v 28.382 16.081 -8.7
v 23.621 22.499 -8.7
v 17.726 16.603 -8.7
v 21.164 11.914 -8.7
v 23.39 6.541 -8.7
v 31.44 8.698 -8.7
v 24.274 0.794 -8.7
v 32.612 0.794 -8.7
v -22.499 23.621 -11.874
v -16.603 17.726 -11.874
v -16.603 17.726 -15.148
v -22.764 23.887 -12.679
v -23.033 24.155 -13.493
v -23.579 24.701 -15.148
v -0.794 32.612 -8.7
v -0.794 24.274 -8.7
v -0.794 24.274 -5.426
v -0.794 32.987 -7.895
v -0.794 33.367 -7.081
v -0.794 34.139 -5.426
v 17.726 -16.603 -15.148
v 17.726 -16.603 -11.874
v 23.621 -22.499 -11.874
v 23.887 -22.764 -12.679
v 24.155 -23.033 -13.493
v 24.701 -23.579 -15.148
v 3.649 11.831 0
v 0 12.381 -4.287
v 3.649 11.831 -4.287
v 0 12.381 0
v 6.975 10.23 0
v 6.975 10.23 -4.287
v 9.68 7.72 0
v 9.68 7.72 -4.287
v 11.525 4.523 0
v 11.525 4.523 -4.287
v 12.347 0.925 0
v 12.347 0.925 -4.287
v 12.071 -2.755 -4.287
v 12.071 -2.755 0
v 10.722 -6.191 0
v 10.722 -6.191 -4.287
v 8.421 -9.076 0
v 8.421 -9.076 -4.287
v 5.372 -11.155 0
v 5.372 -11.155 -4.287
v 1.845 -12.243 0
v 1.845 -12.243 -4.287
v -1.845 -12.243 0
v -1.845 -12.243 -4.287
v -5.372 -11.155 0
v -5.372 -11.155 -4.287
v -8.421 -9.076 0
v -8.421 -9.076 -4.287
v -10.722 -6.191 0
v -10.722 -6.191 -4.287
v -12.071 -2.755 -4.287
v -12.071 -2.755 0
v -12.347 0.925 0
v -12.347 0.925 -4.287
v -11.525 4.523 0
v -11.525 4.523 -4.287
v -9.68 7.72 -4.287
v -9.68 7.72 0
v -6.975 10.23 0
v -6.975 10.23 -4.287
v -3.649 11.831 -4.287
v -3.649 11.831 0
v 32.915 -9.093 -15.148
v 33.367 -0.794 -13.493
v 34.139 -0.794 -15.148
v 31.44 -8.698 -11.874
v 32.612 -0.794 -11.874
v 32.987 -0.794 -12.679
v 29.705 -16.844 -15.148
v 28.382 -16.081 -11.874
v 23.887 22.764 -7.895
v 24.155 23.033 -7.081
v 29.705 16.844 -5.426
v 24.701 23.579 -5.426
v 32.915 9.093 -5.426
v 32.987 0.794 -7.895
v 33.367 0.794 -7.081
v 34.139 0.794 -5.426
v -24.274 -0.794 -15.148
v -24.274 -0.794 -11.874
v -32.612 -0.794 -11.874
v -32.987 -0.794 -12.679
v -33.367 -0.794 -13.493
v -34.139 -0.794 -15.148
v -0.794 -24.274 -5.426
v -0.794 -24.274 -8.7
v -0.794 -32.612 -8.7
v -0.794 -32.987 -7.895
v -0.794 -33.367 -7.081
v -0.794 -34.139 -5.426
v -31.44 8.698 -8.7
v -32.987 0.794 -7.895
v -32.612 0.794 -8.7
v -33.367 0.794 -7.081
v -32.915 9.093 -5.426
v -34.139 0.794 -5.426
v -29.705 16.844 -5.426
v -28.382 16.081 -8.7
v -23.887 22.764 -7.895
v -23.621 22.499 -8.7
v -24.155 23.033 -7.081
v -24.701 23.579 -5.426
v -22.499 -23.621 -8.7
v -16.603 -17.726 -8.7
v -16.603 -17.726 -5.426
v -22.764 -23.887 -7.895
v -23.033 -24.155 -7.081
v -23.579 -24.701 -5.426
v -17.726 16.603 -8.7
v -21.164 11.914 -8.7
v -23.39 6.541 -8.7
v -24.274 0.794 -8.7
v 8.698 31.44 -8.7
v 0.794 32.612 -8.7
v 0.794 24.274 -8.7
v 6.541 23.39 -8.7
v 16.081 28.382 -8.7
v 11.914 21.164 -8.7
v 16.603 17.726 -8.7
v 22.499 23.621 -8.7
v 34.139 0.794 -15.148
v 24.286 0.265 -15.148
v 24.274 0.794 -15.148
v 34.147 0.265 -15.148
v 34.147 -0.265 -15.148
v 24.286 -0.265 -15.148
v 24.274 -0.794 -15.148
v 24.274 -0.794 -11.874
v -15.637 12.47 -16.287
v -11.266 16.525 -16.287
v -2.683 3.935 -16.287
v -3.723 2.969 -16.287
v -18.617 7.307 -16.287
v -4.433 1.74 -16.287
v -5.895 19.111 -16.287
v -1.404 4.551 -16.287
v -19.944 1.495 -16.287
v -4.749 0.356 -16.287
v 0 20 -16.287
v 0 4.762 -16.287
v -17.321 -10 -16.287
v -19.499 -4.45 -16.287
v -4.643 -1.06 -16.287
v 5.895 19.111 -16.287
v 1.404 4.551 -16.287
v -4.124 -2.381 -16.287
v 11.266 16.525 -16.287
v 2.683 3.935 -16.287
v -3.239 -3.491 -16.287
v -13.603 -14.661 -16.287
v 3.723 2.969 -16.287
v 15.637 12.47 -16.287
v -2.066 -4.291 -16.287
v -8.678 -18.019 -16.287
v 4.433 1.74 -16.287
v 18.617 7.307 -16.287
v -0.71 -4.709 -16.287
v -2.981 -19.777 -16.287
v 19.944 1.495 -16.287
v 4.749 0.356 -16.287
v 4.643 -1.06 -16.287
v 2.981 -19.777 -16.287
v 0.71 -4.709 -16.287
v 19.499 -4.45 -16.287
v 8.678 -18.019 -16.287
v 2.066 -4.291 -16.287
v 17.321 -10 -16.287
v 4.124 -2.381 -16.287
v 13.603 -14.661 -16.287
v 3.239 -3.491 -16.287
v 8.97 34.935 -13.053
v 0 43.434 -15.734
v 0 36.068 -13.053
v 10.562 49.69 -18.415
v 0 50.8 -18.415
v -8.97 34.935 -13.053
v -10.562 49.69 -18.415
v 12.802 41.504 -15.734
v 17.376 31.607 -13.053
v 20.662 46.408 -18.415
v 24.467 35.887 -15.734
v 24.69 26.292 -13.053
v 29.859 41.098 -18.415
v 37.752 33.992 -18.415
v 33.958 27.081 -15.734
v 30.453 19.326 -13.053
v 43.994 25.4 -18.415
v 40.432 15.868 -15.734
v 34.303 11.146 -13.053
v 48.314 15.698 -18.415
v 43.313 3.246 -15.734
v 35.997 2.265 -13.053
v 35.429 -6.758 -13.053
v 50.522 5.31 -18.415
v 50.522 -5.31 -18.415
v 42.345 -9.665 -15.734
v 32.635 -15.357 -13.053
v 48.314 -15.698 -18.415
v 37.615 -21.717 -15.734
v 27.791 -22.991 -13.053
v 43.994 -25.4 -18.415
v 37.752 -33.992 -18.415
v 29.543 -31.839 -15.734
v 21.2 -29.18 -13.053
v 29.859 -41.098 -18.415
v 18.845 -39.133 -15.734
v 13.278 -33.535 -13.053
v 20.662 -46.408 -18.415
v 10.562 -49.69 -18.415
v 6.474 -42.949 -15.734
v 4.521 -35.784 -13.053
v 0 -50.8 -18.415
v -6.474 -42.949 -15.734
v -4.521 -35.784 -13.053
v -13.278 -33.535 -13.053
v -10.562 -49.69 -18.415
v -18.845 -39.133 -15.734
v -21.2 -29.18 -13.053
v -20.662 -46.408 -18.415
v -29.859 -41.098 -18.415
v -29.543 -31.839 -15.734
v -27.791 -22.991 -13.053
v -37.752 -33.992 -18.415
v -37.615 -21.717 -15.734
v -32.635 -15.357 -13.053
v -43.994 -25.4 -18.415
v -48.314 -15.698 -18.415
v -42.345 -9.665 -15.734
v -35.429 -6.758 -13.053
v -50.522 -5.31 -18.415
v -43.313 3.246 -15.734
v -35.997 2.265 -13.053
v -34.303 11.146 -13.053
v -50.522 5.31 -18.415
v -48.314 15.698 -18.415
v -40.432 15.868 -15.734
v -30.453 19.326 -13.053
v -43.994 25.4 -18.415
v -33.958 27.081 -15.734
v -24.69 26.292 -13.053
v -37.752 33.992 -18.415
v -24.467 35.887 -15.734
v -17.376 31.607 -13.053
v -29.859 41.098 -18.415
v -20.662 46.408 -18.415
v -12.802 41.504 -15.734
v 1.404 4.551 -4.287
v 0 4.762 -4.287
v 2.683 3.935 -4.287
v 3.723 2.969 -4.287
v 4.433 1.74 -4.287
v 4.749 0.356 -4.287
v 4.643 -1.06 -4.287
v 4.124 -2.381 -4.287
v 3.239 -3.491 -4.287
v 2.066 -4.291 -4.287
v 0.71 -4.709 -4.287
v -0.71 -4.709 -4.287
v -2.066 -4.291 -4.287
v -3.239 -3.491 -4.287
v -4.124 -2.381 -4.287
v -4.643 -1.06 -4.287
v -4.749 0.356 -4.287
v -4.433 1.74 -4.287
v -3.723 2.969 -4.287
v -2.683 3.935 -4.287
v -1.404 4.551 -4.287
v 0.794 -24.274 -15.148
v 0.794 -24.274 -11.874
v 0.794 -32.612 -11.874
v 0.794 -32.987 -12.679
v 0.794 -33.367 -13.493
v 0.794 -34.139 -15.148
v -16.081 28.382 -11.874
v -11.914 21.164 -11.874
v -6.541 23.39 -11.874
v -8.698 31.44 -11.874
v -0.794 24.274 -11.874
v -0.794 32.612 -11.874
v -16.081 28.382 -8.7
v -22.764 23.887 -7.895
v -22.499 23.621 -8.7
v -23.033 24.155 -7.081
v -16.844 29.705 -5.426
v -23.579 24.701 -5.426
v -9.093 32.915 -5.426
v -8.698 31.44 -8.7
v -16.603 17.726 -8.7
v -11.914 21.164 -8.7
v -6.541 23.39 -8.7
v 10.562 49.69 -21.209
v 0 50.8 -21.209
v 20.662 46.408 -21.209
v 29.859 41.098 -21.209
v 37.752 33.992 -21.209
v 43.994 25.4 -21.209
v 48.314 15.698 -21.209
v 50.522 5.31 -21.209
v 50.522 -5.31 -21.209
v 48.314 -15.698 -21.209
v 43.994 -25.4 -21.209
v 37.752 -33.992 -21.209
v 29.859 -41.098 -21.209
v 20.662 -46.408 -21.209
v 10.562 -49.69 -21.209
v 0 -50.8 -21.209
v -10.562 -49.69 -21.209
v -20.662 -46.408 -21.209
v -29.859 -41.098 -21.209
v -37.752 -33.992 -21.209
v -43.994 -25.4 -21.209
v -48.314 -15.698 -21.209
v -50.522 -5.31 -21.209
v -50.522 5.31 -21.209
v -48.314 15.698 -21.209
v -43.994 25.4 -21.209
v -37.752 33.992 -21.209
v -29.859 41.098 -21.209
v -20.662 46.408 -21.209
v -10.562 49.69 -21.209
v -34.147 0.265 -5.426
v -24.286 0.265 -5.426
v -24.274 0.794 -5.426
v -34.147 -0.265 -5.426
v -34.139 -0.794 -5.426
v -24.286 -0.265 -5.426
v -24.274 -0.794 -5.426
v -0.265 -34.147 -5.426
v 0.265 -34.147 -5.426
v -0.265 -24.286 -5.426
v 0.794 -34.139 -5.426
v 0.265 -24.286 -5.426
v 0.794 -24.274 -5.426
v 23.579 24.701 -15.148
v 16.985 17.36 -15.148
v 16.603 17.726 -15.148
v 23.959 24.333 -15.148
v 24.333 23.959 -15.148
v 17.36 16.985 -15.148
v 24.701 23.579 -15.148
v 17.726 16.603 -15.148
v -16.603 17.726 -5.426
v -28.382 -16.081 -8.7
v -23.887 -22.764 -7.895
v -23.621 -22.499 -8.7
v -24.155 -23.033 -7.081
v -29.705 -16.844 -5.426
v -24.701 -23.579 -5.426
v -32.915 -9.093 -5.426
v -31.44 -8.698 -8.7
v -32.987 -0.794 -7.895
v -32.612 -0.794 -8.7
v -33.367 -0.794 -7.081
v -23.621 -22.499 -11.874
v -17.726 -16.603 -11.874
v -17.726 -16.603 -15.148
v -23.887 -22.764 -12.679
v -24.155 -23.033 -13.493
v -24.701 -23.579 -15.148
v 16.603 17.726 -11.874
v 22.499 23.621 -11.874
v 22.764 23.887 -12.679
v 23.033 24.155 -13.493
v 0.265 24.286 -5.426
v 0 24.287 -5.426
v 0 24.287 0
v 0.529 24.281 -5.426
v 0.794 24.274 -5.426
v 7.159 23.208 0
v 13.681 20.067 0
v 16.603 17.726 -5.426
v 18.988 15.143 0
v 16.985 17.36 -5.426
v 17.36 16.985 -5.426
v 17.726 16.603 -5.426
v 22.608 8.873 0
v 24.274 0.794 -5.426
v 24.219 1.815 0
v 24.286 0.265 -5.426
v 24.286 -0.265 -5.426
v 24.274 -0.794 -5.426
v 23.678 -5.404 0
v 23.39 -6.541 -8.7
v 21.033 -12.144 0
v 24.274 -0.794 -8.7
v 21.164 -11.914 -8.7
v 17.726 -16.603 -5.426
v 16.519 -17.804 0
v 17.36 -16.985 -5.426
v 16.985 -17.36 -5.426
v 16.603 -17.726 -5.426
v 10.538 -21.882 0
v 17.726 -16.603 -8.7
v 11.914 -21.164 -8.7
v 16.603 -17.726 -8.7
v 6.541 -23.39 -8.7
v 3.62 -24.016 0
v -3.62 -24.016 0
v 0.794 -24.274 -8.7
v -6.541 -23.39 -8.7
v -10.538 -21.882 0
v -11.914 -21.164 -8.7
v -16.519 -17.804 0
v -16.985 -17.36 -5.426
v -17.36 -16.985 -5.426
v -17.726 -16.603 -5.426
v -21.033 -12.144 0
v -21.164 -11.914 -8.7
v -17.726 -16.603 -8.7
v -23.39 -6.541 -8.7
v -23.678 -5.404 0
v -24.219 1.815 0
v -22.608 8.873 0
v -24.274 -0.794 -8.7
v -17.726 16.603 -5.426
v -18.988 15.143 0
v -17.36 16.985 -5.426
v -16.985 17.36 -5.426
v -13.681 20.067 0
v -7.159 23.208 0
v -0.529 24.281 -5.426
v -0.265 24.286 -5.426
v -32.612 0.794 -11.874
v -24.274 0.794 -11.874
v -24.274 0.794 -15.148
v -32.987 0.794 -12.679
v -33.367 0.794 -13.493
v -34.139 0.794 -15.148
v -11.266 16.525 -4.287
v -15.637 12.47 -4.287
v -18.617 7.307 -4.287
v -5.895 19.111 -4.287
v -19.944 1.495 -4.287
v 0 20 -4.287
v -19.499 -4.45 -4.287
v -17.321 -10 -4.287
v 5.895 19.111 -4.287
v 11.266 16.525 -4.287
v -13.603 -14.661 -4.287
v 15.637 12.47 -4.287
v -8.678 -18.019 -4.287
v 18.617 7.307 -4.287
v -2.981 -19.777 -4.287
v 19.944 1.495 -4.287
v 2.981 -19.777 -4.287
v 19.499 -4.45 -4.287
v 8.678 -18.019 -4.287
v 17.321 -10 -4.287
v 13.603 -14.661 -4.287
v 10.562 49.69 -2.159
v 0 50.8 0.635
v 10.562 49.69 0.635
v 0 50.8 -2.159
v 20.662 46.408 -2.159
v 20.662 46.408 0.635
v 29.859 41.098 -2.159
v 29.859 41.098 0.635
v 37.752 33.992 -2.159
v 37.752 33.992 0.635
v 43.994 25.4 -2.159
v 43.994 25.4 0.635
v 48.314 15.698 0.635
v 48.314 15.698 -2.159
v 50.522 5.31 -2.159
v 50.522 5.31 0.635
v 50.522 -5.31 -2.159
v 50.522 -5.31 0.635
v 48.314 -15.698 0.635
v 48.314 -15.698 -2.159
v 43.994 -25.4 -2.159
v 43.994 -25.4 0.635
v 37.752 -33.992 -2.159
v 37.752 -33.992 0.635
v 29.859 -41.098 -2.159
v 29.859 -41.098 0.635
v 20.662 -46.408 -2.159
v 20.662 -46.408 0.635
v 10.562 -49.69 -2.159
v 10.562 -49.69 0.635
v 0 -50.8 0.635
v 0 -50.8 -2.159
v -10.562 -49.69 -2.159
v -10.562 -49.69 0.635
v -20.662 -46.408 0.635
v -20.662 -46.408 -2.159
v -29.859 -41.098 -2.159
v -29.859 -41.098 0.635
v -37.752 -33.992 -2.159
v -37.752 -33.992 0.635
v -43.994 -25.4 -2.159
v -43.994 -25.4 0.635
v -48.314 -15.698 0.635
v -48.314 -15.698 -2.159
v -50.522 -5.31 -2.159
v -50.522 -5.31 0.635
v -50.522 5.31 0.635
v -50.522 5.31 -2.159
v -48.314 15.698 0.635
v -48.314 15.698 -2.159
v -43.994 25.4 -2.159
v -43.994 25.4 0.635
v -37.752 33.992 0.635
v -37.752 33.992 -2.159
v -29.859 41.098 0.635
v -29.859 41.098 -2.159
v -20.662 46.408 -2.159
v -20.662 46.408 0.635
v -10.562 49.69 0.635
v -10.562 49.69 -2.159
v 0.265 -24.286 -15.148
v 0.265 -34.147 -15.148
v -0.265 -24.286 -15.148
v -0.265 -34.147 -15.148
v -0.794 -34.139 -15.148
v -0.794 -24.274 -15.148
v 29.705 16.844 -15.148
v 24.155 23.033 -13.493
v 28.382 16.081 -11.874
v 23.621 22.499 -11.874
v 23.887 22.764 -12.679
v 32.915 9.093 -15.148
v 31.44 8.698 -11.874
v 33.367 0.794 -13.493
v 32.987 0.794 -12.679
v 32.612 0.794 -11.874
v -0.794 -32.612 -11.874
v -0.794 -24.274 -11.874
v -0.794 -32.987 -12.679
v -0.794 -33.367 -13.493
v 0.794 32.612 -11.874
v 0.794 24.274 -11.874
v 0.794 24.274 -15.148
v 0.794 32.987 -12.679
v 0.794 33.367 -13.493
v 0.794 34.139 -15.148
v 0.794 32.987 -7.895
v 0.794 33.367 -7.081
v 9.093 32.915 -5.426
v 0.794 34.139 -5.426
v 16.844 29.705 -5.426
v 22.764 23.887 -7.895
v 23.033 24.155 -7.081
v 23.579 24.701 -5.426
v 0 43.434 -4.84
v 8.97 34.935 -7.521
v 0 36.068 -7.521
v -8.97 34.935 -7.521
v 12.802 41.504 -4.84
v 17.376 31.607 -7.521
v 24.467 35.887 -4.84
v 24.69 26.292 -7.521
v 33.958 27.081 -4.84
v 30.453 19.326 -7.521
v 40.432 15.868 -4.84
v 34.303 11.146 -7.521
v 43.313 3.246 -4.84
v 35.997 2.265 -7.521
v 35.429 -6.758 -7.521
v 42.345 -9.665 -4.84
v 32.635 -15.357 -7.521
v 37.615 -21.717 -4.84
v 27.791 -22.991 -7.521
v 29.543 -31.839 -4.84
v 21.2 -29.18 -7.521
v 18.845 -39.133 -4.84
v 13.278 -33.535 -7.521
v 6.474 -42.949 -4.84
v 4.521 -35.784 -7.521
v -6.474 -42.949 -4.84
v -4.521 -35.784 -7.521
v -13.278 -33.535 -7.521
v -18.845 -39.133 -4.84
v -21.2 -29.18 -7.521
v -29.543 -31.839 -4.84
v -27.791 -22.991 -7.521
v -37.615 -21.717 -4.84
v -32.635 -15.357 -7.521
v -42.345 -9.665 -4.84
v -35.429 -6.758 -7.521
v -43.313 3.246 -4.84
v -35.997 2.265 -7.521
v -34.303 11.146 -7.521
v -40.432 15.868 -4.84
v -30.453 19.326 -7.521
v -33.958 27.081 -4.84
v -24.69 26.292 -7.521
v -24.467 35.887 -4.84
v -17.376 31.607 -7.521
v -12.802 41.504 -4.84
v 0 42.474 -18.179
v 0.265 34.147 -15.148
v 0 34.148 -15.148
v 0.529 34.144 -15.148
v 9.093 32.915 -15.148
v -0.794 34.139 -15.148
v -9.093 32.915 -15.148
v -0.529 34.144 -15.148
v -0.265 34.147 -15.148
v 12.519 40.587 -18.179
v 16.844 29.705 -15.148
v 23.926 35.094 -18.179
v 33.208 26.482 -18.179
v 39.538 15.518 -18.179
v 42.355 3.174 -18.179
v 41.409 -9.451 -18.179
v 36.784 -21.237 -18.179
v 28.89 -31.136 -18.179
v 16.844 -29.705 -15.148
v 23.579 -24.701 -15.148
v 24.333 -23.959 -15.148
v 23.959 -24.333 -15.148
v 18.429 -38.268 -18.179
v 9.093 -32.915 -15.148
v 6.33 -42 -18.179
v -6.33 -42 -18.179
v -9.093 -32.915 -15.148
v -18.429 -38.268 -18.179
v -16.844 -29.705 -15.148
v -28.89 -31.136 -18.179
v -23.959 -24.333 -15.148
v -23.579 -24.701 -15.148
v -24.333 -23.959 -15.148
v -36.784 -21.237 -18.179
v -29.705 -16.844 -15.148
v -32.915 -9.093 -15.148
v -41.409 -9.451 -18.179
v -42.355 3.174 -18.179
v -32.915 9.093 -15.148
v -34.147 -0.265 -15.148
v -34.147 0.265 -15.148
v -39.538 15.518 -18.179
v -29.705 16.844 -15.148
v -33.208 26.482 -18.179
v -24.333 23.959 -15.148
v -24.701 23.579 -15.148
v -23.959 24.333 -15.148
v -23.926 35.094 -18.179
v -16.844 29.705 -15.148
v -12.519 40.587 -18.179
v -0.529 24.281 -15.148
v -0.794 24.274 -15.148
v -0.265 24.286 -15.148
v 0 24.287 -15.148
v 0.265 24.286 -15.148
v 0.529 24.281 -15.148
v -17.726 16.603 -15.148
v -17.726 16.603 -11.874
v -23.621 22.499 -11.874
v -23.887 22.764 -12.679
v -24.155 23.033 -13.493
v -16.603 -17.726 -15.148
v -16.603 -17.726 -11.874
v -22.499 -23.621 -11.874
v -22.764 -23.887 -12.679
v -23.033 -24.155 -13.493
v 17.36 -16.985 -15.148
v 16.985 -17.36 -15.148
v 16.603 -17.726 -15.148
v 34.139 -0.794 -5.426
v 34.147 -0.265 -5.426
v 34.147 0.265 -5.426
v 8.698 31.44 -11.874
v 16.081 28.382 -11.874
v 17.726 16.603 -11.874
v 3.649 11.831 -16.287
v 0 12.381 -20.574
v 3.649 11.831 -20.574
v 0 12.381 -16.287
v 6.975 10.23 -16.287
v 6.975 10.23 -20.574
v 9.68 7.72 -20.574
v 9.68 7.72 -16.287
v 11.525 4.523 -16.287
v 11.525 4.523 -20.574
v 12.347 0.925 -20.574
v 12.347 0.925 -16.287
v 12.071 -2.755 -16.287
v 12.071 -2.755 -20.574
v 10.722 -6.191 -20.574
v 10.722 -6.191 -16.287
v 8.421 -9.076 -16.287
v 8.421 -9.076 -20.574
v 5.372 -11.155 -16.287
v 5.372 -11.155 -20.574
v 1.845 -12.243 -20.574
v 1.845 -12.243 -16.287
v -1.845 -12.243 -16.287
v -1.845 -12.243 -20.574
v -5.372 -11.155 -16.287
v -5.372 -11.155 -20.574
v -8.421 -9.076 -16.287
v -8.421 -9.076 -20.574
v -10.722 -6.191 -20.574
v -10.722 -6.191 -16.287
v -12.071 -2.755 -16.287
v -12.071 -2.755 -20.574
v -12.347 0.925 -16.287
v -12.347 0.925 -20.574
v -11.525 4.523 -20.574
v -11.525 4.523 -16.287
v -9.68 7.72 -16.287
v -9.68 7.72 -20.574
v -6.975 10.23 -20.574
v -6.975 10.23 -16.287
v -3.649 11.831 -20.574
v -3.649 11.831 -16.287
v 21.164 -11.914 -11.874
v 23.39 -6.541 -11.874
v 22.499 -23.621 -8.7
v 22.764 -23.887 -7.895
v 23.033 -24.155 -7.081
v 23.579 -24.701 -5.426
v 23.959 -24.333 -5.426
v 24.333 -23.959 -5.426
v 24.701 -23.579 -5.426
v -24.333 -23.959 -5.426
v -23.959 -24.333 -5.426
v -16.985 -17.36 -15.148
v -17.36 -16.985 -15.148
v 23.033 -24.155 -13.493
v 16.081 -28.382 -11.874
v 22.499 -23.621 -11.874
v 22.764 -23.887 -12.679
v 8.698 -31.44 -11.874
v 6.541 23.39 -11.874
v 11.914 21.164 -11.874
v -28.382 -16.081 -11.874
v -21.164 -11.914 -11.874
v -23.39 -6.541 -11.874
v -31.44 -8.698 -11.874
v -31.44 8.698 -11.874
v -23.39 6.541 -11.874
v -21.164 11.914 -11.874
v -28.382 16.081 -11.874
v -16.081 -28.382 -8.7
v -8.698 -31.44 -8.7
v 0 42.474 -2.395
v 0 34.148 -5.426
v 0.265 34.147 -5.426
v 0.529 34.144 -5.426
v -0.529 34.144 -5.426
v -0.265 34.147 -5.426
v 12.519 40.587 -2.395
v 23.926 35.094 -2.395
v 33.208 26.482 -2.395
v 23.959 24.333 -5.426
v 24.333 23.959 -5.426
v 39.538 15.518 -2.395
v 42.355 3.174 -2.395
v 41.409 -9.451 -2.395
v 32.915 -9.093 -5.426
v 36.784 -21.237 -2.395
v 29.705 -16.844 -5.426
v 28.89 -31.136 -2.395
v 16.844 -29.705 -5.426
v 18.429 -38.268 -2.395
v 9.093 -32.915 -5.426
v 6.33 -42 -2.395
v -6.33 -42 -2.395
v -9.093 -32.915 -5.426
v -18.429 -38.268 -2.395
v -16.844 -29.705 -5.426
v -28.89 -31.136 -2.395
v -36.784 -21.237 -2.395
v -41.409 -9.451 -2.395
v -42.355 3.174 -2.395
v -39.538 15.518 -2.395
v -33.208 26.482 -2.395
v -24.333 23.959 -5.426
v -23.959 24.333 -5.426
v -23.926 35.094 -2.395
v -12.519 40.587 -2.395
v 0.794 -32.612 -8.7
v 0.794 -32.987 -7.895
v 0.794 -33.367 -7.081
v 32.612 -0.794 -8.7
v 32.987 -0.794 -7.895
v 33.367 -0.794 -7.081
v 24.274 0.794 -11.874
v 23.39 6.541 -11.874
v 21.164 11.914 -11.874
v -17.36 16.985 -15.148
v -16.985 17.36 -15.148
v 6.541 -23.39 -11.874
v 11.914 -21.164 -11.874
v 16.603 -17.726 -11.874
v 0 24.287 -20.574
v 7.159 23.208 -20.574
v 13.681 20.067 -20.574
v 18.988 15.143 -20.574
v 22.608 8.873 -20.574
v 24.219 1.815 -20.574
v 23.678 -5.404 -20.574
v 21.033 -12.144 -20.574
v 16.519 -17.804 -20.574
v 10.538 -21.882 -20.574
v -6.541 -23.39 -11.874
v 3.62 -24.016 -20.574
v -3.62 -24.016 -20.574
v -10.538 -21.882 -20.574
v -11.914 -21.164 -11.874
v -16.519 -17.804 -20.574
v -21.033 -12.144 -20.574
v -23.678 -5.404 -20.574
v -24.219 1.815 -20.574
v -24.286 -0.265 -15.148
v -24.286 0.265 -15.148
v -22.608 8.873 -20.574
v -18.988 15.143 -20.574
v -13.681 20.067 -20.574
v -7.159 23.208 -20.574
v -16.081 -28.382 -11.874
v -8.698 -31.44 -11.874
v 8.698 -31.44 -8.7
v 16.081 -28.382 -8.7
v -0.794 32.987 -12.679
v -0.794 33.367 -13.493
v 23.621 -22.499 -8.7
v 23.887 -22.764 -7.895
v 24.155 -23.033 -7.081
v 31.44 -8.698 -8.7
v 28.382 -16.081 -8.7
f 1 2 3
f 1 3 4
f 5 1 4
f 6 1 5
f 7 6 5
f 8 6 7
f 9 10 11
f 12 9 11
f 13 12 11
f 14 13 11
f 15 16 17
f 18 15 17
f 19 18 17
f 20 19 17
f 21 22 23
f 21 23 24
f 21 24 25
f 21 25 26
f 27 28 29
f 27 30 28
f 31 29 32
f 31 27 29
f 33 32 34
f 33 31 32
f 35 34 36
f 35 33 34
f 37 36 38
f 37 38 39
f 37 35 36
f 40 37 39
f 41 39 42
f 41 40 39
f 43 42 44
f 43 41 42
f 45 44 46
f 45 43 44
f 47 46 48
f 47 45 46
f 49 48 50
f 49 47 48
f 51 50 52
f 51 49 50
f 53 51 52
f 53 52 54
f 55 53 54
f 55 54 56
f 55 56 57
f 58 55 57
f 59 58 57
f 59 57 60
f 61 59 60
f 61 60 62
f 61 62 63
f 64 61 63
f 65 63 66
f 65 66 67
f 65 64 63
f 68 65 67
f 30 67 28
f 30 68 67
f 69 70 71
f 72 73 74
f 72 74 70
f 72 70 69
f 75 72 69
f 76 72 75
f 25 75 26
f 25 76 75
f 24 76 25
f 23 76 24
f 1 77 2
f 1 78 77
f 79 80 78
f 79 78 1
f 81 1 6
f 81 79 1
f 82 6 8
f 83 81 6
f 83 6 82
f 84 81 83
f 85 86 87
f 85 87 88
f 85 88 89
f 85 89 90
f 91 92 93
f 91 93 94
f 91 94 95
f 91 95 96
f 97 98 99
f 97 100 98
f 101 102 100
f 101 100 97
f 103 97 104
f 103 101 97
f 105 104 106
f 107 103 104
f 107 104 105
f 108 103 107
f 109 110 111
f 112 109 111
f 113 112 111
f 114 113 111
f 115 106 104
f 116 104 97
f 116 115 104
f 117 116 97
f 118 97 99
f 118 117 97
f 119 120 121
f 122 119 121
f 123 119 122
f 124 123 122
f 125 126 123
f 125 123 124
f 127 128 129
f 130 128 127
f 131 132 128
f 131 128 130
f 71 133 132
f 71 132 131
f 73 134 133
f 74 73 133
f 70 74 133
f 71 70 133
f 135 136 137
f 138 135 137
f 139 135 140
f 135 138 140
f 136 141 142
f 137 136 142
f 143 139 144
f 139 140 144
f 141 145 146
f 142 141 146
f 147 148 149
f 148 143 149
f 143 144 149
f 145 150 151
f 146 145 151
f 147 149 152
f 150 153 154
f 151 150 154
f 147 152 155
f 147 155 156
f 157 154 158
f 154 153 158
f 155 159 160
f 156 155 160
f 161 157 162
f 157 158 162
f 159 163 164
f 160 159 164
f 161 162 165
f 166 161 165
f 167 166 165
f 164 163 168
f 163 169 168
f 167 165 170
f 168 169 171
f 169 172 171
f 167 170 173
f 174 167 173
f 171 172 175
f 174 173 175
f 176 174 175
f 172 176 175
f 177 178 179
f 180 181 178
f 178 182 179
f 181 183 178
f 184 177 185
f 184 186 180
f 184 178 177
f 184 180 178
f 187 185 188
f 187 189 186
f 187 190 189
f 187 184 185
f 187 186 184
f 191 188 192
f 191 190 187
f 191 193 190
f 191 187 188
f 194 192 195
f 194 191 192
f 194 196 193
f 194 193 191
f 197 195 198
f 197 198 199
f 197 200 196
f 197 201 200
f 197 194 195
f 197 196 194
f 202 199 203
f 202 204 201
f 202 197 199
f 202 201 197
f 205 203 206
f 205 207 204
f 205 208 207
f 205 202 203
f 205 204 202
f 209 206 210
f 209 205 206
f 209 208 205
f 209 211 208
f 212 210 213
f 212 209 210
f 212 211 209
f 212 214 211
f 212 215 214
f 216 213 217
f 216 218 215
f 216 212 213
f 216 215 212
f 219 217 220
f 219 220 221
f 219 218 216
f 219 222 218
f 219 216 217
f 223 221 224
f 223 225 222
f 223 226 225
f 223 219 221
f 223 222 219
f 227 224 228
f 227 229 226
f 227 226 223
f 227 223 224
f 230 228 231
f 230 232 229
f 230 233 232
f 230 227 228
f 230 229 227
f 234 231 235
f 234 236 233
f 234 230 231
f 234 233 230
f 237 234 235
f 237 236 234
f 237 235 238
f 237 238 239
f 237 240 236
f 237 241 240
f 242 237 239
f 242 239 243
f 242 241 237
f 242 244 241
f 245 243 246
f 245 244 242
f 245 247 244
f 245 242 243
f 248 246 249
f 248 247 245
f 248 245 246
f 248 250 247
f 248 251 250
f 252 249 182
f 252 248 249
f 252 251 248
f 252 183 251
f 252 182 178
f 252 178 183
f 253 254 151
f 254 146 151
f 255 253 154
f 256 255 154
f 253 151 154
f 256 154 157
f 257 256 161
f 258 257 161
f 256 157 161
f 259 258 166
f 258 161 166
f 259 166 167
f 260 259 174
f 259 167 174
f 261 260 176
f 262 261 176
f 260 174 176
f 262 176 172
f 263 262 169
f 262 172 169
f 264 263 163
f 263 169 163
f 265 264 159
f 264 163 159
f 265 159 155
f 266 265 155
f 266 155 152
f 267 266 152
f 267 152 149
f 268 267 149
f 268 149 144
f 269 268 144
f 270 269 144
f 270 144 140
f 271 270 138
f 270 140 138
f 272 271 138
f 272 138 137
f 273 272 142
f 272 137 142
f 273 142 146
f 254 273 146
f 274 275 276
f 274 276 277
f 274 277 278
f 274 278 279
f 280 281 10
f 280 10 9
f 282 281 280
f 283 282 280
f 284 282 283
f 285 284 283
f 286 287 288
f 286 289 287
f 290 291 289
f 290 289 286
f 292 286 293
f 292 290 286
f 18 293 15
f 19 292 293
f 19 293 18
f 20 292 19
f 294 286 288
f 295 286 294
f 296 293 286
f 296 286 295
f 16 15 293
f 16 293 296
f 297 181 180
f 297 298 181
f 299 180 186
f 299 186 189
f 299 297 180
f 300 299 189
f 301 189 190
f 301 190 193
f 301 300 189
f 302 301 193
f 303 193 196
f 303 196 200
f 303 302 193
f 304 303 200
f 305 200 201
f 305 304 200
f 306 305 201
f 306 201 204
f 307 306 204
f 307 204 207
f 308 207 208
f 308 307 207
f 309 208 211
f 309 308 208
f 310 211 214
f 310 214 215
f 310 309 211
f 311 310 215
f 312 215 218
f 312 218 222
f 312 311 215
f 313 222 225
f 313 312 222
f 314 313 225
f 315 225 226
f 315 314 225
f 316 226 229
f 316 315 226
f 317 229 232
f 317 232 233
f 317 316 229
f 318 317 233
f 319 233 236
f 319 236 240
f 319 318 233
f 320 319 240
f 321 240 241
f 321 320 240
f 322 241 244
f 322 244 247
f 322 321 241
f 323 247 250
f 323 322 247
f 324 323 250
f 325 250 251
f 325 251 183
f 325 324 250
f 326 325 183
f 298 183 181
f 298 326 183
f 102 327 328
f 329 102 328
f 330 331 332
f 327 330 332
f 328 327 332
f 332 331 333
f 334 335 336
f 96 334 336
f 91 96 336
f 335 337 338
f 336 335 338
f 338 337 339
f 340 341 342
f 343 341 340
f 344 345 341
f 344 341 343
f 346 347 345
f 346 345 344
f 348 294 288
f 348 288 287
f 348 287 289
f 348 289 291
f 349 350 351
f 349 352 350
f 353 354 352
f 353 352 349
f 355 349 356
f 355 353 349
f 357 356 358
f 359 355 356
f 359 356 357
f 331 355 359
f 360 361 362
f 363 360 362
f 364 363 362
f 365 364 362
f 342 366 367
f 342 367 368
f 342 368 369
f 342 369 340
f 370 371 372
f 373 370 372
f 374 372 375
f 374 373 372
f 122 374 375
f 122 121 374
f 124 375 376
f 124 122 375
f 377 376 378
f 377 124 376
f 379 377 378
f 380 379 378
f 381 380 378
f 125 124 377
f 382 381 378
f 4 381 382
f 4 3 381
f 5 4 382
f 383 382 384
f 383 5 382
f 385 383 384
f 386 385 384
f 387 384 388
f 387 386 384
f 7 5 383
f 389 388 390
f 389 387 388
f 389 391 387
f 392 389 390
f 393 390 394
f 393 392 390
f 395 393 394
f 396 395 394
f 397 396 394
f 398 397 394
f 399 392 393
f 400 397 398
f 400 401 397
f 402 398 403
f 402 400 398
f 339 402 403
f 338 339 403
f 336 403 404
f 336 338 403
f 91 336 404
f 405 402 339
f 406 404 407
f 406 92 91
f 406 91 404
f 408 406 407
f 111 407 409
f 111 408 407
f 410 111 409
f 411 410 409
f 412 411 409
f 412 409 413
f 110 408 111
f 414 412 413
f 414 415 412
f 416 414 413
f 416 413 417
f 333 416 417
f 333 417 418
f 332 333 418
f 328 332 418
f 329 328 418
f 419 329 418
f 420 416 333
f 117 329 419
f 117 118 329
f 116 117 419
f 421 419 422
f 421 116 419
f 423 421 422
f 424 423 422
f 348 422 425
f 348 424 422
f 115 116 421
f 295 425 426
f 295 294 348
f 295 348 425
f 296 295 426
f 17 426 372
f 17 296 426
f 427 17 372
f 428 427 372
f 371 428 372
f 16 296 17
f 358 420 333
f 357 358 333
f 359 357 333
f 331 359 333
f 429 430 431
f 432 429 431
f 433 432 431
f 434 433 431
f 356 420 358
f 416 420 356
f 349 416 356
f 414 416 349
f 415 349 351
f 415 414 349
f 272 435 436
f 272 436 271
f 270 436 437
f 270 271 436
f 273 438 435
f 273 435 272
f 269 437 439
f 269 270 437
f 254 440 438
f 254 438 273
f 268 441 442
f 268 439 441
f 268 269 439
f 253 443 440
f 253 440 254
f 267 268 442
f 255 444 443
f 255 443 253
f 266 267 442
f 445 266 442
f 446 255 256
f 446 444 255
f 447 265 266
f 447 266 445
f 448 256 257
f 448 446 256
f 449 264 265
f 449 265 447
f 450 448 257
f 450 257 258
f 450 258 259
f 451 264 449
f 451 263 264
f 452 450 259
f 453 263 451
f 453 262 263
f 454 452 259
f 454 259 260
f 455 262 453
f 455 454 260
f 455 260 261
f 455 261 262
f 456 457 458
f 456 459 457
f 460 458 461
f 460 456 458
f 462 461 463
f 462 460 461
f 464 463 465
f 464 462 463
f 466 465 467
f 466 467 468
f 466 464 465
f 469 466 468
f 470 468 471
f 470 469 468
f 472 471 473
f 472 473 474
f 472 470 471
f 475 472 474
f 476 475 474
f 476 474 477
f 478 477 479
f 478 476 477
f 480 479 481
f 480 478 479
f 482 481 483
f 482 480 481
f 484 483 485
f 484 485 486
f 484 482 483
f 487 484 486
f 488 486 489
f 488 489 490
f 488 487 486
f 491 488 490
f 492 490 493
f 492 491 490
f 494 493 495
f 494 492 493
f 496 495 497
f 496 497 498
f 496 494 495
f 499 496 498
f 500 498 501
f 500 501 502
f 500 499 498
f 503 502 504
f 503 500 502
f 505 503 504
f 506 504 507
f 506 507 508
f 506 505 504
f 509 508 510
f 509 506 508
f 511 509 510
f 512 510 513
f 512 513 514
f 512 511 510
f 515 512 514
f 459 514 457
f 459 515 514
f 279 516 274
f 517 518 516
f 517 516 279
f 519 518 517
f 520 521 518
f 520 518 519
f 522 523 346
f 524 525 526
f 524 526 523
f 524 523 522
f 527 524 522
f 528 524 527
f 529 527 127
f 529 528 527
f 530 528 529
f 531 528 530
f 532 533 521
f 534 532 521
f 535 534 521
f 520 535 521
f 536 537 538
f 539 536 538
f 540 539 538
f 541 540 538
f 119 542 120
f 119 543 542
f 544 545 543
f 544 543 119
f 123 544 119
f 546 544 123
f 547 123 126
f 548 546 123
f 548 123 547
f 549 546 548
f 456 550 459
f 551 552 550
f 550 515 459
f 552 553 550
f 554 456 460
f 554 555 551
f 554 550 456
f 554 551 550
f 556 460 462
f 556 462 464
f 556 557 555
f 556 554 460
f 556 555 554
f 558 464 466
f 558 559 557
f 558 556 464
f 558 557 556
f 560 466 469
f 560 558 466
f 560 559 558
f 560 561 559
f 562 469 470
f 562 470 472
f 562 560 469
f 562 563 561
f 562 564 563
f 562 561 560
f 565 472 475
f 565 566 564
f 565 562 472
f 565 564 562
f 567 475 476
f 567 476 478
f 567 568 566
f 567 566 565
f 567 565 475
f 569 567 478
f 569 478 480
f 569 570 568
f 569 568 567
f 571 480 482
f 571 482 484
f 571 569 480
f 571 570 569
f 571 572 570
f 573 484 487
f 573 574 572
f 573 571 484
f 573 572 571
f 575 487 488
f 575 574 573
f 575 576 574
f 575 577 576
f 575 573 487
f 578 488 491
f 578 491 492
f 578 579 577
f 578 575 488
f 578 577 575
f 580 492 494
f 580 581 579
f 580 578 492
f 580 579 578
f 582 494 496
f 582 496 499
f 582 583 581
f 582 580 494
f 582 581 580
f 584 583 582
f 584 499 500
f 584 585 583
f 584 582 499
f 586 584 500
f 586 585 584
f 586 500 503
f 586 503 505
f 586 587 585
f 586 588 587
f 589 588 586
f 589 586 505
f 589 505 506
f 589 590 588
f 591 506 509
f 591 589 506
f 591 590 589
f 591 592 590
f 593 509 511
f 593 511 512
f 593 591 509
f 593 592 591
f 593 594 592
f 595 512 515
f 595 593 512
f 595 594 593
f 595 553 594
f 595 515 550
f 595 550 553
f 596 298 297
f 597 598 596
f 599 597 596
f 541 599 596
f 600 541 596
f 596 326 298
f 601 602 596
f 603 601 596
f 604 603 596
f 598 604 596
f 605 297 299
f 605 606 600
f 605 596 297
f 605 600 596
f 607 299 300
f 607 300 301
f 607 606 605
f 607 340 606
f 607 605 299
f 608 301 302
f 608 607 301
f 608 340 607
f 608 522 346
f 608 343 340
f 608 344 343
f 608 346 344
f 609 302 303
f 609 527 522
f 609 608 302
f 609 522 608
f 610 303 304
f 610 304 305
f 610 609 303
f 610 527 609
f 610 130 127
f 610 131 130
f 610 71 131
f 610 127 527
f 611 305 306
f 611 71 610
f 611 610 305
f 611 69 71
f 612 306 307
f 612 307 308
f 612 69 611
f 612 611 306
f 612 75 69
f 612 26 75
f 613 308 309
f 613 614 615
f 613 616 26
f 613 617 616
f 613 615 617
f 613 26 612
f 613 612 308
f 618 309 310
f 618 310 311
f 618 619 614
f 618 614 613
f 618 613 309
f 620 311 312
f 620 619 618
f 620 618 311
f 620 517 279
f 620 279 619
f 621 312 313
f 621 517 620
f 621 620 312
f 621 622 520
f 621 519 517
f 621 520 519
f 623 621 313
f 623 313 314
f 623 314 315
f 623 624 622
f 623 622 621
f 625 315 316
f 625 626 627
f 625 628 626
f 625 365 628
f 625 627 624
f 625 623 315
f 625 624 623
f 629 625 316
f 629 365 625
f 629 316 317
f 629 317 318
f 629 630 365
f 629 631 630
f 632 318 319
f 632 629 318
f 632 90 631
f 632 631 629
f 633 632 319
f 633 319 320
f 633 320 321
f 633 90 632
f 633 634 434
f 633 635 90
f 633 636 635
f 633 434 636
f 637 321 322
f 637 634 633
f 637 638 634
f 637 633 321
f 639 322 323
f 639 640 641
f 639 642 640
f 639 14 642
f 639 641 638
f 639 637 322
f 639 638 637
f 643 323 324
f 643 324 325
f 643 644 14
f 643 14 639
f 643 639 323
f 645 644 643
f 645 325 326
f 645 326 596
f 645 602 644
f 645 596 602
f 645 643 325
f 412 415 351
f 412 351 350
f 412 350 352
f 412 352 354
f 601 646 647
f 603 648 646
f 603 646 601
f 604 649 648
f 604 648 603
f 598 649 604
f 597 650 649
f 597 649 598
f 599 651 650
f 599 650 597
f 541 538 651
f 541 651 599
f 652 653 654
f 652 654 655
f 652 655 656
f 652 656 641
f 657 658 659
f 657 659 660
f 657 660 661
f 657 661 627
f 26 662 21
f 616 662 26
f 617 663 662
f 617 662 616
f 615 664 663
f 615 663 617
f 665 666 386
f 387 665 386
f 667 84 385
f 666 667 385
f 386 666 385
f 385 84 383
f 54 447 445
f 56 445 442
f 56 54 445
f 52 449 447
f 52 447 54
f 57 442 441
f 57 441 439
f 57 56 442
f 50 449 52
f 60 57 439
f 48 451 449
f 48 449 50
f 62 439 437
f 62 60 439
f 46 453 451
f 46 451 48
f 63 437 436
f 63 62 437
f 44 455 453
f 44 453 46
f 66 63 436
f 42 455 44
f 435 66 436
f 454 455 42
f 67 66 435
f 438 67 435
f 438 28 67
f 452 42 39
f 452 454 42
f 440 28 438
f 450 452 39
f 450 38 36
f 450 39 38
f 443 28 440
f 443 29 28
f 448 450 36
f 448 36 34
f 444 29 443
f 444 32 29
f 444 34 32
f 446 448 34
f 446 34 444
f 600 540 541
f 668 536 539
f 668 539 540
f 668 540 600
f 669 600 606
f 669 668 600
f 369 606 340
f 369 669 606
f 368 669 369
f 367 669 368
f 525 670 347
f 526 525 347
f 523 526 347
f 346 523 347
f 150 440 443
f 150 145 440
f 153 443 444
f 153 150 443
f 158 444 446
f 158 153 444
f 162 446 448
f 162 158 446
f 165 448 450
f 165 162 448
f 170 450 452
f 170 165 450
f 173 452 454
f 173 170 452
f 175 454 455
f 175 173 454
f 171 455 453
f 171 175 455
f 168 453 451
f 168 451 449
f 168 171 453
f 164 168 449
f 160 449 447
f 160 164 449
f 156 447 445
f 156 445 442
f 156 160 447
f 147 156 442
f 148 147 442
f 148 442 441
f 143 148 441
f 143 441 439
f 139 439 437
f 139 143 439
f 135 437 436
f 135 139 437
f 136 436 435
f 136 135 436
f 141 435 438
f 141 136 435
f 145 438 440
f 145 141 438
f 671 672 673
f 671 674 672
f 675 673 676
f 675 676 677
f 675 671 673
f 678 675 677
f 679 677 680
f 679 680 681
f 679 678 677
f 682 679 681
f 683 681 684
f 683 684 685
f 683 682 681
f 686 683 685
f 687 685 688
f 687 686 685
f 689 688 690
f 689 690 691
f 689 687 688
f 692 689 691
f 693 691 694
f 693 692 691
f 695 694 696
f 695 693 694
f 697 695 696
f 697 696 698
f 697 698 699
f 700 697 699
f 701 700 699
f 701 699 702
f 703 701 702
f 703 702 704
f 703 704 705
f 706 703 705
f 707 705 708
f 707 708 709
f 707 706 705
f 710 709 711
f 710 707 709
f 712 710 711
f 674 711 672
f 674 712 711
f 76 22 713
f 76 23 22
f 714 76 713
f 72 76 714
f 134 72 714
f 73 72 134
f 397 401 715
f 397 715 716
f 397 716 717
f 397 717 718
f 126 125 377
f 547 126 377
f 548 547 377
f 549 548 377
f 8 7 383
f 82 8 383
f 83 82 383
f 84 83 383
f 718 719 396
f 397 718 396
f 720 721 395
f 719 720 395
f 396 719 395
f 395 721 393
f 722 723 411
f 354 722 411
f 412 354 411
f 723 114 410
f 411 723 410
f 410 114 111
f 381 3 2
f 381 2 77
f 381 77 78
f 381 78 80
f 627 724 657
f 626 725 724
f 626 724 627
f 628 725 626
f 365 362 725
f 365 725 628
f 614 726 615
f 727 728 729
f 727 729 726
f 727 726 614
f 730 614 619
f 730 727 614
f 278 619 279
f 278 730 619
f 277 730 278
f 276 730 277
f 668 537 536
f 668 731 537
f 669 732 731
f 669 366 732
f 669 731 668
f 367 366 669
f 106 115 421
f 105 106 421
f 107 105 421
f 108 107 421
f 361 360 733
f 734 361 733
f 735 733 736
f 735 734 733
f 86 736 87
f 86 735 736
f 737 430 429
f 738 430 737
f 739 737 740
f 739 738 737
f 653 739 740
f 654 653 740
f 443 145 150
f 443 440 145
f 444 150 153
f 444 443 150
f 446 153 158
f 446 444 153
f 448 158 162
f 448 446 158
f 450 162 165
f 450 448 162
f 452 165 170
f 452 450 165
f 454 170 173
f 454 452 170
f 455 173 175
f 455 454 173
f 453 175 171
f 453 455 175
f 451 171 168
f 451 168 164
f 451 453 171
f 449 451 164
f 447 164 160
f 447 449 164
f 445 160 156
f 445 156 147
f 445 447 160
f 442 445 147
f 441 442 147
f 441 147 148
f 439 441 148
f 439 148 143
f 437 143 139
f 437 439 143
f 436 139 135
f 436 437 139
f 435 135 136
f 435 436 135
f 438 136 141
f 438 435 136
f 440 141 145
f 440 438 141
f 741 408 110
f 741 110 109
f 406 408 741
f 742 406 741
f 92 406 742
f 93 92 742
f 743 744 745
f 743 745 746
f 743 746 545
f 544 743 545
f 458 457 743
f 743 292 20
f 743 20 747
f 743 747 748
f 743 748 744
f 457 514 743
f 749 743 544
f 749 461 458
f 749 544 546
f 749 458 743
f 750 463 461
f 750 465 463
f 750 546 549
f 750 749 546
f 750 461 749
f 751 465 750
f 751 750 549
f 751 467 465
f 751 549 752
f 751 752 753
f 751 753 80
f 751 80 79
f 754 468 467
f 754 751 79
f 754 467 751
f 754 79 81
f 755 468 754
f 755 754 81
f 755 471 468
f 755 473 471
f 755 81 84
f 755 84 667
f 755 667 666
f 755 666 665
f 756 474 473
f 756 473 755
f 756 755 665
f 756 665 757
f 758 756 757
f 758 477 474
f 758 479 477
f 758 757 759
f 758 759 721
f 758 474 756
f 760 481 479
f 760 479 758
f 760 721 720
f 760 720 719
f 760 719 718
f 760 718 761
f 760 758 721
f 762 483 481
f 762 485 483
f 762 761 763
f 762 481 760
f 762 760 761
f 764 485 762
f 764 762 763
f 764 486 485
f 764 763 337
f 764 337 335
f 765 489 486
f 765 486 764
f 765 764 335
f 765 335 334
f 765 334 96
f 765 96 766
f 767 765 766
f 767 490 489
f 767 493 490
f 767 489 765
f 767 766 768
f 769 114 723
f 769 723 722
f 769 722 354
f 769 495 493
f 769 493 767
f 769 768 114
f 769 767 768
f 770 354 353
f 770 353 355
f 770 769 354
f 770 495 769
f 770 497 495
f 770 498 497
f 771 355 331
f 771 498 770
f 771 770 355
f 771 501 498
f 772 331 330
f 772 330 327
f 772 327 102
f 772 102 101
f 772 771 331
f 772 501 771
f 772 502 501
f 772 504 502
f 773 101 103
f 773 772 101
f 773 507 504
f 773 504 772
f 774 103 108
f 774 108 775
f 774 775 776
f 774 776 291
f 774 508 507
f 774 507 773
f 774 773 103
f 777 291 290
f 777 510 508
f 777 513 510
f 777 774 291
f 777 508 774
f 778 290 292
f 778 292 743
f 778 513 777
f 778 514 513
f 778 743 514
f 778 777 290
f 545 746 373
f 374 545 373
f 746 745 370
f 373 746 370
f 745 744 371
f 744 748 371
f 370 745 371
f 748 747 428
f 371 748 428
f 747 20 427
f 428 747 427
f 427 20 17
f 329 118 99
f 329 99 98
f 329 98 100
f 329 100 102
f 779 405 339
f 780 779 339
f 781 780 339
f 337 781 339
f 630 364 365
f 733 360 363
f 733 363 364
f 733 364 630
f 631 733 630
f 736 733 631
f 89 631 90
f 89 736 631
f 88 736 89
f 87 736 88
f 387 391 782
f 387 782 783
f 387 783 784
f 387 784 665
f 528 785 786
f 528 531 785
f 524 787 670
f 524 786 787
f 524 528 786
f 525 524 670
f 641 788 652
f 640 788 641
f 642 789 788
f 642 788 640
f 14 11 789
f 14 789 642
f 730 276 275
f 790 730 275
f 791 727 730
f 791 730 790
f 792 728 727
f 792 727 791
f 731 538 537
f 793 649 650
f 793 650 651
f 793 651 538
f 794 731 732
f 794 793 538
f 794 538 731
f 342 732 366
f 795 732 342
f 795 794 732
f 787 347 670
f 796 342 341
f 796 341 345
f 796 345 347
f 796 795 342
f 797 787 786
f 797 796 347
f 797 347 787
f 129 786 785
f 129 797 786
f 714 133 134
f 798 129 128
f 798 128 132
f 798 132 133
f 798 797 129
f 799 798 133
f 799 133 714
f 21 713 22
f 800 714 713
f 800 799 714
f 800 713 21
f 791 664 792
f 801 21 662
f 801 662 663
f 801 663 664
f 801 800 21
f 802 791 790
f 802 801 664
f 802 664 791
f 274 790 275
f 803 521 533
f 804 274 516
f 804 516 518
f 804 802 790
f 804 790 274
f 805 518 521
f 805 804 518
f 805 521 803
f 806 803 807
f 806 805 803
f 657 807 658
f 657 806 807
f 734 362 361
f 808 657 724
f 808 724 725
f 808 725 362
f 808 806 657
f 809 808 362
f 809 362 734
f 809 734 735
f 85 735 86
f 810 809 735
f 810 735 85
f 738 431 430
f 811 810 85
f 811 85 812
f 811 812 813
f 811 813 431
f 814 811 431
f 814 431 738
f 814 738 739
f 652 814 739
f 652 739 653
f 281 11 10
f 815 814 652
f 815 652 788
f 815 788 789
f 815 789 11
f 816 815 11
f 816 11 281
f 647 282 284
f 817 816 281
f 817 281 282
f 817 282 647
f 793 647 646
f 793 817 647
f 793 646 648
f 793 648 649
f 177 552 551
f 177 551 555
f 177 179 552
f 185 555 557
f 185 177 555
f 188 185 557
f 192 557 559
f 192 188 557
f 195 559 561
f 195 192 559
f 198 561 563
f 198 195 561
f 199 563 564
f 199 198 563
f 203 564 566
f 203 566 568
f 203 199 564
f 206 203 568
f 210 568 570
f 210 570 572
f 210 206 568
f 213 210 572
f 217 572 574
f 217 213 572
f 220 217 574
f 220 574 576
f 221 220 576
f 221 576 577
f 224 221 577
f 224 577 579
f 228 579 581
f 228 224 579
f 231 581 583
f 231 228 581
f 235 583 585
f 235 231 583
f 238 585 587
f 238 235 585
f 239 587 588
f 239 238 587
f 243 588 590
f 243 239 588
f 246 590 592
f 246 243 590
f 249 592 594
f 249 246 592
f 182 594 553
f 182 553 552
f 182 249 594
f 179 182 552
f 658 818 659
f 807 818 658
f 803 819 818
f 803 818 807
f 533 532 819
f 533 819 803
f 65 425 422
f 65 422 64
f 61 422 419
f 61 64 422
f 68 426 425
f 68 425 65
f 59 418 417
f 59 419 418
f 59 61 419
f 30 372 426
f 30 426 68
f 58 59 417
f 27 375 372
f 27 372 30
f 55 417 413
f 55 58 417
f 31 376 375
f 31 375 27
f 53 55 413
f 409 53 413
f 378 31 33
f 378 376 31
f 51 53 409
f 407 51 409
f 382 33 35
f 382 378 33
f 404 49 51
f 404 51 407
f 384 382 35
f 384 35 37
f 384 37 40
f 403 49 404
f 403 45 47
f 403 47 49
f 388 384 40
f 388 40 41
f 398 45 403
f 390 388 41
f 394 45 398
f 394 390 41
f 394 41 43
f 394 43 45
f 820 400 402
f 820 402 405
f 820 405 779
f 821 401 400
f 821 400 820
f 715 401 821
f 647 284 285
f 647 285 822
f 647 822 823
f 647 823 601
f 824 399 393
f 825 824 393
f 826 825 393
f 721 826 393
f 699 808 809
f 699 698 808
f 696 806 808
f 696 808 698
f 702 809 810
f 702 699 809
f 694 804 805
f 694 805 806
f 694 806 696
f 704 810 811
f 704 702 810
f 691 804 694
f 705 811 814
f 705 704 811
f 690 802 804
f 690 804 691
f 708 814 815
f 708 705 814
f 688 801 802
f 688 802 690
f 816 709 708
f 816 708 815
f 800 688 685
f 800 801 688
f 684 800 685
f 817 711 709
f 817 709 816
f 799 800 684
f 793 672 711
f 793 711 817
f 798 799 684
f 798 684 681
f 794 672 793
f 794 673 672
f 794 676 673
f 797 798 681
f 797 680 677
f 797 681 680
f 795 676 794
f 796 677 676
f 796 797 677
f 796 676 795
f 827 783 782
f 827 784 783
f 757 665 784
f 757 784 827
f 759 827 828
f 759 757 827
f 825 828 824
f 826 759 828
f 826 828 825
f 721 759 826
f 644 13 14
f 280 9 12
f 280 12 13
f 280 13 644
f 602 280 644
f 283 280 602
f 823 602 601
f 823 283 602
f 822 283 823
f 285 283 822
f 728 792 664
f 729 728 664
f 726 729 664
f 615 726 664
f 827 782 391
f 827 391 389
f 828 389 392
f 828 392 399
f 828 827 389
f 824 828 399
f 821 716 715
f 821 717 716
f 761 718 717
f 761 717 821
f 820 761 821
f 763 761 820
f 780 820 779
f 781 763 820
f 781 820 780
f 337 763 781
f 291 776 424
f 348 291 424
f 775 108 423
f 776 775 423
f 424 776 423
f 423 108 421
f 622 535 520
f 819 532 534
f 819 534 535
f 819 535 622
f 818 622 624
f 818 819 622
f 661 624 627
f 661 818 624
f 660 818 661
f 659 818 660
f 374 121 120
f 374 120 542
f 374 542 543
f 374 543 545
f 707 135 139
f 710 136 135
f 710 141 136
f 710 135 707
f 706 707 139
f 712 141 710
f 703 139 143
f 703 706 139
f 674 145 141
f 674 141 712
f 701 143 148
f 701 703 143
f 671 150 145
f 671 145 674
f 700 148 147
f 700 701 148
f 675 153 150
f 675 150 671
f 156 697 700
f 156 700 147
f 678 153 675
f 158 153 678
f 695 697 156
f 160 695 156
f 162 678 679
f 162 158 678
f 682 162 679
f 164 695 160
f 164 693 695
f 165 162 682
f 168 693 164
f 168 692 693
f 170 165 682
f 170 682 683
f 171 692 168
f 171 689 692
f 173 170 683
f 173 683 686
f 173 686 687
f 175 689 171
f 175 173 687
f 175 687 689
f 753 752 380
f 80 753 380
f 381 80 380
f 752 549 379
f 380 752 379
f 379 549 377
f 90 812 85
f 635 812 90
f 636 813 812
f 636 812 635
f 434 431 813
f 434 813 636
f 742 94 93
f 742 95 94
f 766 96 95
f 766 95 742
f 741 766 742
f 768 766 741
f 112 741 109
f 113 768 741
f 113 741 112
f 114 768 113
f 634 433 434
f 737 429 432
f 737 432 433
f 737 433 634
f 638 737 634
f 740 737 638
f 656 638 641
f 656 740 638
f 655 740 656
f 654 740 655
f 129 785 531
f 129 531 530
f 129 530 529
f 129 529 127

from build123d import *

# Parameters (mm, degrees)
SKETCH2_W           = 12
SKETCH2_H           = 15.2375
BOSS_EXTRUDE2_DEPTH = 0.79375
CIRPATTERN1_COUNT   = 8


with BuildPart() as part:
    # Sketch1 → Revolve1 (revolve)
    with BuildSketch(Plane(origin=(0, 0, 0), x_dir=(0, 0, -1), z_dir=(1, 0, 0))):
        Polygon((18.415, 50.8), (21.209, 50.8), (15.148201466, 34.148092884), (11.8745, 32.62154082), (11.8745, 24.287), (20.574, 24.287), (20.574, 12.38125), (16.287, 12.38125), (16.287, 20), (4.287, 20), (4.287, 12.38125), (0, 12.38125), (0, 24.287), (8.6995, 24.287), (8.6995, 32.62154082), (5.425798534, 34.148092884), (-0.635, 50.8), (2.159, 50.8), (7.521009491, 36.068), (13.052990509, 36.068), align=None)
    revolve(axis=Axis((0, 0, 0), (0, 0, -1)))

    # Sketch4 → Boss-Extrude2 (add, symmetric)
    with BuildSketch(Plane(origin=(0, 0, 0), x_dir=(0, 0, -1), z_dir=(1, 0, 0))):
        Polygon((8.6995, 32.62154082), (8.6995, 24.287), (8.6995, 23.017), (5.425798534, 23.017), (5.425798534, 24.287), (5.425798534, 34.148092884), align=None)
        Polygon((15.148201466, 23.017), (15.148201466, 24.287), (15.148201466, 34.148092884), (11.8745, 32.62154082), (11.8745, 24.287), (11.8745, 23.017), align=None)
    boss_extrude2 = extrude(amount=BOSS_EXTRUDE2_DEPTH, both=True)

    # CirPattern1: Boss-Extrude2 ×8 about axis
    cirpattern1_axis = Axis((0, 0, 0), (0, 0, 1))
    for i in range(1, CIRPATTERN1_COUNT):
        add(boss_extrude2.rotate(cirpattern1_axis, i * 360 / CIRPATTERN1_COUNT))


with BuildPart() as body_2:
    # Sketch2 → Revolve2 (revolve)
    with BuildSketch(Plane(origin=(0, 0, 0), x_dir=(0, 0, -1), z_dir=(1, 0, 0))):
        with Locations((10.287, 12.38125)):
            Rectangle(SKETCH2_W, SKETCH2_H)
    revolve(axis=Axis((0, 0, 0), (0, 0, -1)))


solid = Compound([part.part, body_2.part])
